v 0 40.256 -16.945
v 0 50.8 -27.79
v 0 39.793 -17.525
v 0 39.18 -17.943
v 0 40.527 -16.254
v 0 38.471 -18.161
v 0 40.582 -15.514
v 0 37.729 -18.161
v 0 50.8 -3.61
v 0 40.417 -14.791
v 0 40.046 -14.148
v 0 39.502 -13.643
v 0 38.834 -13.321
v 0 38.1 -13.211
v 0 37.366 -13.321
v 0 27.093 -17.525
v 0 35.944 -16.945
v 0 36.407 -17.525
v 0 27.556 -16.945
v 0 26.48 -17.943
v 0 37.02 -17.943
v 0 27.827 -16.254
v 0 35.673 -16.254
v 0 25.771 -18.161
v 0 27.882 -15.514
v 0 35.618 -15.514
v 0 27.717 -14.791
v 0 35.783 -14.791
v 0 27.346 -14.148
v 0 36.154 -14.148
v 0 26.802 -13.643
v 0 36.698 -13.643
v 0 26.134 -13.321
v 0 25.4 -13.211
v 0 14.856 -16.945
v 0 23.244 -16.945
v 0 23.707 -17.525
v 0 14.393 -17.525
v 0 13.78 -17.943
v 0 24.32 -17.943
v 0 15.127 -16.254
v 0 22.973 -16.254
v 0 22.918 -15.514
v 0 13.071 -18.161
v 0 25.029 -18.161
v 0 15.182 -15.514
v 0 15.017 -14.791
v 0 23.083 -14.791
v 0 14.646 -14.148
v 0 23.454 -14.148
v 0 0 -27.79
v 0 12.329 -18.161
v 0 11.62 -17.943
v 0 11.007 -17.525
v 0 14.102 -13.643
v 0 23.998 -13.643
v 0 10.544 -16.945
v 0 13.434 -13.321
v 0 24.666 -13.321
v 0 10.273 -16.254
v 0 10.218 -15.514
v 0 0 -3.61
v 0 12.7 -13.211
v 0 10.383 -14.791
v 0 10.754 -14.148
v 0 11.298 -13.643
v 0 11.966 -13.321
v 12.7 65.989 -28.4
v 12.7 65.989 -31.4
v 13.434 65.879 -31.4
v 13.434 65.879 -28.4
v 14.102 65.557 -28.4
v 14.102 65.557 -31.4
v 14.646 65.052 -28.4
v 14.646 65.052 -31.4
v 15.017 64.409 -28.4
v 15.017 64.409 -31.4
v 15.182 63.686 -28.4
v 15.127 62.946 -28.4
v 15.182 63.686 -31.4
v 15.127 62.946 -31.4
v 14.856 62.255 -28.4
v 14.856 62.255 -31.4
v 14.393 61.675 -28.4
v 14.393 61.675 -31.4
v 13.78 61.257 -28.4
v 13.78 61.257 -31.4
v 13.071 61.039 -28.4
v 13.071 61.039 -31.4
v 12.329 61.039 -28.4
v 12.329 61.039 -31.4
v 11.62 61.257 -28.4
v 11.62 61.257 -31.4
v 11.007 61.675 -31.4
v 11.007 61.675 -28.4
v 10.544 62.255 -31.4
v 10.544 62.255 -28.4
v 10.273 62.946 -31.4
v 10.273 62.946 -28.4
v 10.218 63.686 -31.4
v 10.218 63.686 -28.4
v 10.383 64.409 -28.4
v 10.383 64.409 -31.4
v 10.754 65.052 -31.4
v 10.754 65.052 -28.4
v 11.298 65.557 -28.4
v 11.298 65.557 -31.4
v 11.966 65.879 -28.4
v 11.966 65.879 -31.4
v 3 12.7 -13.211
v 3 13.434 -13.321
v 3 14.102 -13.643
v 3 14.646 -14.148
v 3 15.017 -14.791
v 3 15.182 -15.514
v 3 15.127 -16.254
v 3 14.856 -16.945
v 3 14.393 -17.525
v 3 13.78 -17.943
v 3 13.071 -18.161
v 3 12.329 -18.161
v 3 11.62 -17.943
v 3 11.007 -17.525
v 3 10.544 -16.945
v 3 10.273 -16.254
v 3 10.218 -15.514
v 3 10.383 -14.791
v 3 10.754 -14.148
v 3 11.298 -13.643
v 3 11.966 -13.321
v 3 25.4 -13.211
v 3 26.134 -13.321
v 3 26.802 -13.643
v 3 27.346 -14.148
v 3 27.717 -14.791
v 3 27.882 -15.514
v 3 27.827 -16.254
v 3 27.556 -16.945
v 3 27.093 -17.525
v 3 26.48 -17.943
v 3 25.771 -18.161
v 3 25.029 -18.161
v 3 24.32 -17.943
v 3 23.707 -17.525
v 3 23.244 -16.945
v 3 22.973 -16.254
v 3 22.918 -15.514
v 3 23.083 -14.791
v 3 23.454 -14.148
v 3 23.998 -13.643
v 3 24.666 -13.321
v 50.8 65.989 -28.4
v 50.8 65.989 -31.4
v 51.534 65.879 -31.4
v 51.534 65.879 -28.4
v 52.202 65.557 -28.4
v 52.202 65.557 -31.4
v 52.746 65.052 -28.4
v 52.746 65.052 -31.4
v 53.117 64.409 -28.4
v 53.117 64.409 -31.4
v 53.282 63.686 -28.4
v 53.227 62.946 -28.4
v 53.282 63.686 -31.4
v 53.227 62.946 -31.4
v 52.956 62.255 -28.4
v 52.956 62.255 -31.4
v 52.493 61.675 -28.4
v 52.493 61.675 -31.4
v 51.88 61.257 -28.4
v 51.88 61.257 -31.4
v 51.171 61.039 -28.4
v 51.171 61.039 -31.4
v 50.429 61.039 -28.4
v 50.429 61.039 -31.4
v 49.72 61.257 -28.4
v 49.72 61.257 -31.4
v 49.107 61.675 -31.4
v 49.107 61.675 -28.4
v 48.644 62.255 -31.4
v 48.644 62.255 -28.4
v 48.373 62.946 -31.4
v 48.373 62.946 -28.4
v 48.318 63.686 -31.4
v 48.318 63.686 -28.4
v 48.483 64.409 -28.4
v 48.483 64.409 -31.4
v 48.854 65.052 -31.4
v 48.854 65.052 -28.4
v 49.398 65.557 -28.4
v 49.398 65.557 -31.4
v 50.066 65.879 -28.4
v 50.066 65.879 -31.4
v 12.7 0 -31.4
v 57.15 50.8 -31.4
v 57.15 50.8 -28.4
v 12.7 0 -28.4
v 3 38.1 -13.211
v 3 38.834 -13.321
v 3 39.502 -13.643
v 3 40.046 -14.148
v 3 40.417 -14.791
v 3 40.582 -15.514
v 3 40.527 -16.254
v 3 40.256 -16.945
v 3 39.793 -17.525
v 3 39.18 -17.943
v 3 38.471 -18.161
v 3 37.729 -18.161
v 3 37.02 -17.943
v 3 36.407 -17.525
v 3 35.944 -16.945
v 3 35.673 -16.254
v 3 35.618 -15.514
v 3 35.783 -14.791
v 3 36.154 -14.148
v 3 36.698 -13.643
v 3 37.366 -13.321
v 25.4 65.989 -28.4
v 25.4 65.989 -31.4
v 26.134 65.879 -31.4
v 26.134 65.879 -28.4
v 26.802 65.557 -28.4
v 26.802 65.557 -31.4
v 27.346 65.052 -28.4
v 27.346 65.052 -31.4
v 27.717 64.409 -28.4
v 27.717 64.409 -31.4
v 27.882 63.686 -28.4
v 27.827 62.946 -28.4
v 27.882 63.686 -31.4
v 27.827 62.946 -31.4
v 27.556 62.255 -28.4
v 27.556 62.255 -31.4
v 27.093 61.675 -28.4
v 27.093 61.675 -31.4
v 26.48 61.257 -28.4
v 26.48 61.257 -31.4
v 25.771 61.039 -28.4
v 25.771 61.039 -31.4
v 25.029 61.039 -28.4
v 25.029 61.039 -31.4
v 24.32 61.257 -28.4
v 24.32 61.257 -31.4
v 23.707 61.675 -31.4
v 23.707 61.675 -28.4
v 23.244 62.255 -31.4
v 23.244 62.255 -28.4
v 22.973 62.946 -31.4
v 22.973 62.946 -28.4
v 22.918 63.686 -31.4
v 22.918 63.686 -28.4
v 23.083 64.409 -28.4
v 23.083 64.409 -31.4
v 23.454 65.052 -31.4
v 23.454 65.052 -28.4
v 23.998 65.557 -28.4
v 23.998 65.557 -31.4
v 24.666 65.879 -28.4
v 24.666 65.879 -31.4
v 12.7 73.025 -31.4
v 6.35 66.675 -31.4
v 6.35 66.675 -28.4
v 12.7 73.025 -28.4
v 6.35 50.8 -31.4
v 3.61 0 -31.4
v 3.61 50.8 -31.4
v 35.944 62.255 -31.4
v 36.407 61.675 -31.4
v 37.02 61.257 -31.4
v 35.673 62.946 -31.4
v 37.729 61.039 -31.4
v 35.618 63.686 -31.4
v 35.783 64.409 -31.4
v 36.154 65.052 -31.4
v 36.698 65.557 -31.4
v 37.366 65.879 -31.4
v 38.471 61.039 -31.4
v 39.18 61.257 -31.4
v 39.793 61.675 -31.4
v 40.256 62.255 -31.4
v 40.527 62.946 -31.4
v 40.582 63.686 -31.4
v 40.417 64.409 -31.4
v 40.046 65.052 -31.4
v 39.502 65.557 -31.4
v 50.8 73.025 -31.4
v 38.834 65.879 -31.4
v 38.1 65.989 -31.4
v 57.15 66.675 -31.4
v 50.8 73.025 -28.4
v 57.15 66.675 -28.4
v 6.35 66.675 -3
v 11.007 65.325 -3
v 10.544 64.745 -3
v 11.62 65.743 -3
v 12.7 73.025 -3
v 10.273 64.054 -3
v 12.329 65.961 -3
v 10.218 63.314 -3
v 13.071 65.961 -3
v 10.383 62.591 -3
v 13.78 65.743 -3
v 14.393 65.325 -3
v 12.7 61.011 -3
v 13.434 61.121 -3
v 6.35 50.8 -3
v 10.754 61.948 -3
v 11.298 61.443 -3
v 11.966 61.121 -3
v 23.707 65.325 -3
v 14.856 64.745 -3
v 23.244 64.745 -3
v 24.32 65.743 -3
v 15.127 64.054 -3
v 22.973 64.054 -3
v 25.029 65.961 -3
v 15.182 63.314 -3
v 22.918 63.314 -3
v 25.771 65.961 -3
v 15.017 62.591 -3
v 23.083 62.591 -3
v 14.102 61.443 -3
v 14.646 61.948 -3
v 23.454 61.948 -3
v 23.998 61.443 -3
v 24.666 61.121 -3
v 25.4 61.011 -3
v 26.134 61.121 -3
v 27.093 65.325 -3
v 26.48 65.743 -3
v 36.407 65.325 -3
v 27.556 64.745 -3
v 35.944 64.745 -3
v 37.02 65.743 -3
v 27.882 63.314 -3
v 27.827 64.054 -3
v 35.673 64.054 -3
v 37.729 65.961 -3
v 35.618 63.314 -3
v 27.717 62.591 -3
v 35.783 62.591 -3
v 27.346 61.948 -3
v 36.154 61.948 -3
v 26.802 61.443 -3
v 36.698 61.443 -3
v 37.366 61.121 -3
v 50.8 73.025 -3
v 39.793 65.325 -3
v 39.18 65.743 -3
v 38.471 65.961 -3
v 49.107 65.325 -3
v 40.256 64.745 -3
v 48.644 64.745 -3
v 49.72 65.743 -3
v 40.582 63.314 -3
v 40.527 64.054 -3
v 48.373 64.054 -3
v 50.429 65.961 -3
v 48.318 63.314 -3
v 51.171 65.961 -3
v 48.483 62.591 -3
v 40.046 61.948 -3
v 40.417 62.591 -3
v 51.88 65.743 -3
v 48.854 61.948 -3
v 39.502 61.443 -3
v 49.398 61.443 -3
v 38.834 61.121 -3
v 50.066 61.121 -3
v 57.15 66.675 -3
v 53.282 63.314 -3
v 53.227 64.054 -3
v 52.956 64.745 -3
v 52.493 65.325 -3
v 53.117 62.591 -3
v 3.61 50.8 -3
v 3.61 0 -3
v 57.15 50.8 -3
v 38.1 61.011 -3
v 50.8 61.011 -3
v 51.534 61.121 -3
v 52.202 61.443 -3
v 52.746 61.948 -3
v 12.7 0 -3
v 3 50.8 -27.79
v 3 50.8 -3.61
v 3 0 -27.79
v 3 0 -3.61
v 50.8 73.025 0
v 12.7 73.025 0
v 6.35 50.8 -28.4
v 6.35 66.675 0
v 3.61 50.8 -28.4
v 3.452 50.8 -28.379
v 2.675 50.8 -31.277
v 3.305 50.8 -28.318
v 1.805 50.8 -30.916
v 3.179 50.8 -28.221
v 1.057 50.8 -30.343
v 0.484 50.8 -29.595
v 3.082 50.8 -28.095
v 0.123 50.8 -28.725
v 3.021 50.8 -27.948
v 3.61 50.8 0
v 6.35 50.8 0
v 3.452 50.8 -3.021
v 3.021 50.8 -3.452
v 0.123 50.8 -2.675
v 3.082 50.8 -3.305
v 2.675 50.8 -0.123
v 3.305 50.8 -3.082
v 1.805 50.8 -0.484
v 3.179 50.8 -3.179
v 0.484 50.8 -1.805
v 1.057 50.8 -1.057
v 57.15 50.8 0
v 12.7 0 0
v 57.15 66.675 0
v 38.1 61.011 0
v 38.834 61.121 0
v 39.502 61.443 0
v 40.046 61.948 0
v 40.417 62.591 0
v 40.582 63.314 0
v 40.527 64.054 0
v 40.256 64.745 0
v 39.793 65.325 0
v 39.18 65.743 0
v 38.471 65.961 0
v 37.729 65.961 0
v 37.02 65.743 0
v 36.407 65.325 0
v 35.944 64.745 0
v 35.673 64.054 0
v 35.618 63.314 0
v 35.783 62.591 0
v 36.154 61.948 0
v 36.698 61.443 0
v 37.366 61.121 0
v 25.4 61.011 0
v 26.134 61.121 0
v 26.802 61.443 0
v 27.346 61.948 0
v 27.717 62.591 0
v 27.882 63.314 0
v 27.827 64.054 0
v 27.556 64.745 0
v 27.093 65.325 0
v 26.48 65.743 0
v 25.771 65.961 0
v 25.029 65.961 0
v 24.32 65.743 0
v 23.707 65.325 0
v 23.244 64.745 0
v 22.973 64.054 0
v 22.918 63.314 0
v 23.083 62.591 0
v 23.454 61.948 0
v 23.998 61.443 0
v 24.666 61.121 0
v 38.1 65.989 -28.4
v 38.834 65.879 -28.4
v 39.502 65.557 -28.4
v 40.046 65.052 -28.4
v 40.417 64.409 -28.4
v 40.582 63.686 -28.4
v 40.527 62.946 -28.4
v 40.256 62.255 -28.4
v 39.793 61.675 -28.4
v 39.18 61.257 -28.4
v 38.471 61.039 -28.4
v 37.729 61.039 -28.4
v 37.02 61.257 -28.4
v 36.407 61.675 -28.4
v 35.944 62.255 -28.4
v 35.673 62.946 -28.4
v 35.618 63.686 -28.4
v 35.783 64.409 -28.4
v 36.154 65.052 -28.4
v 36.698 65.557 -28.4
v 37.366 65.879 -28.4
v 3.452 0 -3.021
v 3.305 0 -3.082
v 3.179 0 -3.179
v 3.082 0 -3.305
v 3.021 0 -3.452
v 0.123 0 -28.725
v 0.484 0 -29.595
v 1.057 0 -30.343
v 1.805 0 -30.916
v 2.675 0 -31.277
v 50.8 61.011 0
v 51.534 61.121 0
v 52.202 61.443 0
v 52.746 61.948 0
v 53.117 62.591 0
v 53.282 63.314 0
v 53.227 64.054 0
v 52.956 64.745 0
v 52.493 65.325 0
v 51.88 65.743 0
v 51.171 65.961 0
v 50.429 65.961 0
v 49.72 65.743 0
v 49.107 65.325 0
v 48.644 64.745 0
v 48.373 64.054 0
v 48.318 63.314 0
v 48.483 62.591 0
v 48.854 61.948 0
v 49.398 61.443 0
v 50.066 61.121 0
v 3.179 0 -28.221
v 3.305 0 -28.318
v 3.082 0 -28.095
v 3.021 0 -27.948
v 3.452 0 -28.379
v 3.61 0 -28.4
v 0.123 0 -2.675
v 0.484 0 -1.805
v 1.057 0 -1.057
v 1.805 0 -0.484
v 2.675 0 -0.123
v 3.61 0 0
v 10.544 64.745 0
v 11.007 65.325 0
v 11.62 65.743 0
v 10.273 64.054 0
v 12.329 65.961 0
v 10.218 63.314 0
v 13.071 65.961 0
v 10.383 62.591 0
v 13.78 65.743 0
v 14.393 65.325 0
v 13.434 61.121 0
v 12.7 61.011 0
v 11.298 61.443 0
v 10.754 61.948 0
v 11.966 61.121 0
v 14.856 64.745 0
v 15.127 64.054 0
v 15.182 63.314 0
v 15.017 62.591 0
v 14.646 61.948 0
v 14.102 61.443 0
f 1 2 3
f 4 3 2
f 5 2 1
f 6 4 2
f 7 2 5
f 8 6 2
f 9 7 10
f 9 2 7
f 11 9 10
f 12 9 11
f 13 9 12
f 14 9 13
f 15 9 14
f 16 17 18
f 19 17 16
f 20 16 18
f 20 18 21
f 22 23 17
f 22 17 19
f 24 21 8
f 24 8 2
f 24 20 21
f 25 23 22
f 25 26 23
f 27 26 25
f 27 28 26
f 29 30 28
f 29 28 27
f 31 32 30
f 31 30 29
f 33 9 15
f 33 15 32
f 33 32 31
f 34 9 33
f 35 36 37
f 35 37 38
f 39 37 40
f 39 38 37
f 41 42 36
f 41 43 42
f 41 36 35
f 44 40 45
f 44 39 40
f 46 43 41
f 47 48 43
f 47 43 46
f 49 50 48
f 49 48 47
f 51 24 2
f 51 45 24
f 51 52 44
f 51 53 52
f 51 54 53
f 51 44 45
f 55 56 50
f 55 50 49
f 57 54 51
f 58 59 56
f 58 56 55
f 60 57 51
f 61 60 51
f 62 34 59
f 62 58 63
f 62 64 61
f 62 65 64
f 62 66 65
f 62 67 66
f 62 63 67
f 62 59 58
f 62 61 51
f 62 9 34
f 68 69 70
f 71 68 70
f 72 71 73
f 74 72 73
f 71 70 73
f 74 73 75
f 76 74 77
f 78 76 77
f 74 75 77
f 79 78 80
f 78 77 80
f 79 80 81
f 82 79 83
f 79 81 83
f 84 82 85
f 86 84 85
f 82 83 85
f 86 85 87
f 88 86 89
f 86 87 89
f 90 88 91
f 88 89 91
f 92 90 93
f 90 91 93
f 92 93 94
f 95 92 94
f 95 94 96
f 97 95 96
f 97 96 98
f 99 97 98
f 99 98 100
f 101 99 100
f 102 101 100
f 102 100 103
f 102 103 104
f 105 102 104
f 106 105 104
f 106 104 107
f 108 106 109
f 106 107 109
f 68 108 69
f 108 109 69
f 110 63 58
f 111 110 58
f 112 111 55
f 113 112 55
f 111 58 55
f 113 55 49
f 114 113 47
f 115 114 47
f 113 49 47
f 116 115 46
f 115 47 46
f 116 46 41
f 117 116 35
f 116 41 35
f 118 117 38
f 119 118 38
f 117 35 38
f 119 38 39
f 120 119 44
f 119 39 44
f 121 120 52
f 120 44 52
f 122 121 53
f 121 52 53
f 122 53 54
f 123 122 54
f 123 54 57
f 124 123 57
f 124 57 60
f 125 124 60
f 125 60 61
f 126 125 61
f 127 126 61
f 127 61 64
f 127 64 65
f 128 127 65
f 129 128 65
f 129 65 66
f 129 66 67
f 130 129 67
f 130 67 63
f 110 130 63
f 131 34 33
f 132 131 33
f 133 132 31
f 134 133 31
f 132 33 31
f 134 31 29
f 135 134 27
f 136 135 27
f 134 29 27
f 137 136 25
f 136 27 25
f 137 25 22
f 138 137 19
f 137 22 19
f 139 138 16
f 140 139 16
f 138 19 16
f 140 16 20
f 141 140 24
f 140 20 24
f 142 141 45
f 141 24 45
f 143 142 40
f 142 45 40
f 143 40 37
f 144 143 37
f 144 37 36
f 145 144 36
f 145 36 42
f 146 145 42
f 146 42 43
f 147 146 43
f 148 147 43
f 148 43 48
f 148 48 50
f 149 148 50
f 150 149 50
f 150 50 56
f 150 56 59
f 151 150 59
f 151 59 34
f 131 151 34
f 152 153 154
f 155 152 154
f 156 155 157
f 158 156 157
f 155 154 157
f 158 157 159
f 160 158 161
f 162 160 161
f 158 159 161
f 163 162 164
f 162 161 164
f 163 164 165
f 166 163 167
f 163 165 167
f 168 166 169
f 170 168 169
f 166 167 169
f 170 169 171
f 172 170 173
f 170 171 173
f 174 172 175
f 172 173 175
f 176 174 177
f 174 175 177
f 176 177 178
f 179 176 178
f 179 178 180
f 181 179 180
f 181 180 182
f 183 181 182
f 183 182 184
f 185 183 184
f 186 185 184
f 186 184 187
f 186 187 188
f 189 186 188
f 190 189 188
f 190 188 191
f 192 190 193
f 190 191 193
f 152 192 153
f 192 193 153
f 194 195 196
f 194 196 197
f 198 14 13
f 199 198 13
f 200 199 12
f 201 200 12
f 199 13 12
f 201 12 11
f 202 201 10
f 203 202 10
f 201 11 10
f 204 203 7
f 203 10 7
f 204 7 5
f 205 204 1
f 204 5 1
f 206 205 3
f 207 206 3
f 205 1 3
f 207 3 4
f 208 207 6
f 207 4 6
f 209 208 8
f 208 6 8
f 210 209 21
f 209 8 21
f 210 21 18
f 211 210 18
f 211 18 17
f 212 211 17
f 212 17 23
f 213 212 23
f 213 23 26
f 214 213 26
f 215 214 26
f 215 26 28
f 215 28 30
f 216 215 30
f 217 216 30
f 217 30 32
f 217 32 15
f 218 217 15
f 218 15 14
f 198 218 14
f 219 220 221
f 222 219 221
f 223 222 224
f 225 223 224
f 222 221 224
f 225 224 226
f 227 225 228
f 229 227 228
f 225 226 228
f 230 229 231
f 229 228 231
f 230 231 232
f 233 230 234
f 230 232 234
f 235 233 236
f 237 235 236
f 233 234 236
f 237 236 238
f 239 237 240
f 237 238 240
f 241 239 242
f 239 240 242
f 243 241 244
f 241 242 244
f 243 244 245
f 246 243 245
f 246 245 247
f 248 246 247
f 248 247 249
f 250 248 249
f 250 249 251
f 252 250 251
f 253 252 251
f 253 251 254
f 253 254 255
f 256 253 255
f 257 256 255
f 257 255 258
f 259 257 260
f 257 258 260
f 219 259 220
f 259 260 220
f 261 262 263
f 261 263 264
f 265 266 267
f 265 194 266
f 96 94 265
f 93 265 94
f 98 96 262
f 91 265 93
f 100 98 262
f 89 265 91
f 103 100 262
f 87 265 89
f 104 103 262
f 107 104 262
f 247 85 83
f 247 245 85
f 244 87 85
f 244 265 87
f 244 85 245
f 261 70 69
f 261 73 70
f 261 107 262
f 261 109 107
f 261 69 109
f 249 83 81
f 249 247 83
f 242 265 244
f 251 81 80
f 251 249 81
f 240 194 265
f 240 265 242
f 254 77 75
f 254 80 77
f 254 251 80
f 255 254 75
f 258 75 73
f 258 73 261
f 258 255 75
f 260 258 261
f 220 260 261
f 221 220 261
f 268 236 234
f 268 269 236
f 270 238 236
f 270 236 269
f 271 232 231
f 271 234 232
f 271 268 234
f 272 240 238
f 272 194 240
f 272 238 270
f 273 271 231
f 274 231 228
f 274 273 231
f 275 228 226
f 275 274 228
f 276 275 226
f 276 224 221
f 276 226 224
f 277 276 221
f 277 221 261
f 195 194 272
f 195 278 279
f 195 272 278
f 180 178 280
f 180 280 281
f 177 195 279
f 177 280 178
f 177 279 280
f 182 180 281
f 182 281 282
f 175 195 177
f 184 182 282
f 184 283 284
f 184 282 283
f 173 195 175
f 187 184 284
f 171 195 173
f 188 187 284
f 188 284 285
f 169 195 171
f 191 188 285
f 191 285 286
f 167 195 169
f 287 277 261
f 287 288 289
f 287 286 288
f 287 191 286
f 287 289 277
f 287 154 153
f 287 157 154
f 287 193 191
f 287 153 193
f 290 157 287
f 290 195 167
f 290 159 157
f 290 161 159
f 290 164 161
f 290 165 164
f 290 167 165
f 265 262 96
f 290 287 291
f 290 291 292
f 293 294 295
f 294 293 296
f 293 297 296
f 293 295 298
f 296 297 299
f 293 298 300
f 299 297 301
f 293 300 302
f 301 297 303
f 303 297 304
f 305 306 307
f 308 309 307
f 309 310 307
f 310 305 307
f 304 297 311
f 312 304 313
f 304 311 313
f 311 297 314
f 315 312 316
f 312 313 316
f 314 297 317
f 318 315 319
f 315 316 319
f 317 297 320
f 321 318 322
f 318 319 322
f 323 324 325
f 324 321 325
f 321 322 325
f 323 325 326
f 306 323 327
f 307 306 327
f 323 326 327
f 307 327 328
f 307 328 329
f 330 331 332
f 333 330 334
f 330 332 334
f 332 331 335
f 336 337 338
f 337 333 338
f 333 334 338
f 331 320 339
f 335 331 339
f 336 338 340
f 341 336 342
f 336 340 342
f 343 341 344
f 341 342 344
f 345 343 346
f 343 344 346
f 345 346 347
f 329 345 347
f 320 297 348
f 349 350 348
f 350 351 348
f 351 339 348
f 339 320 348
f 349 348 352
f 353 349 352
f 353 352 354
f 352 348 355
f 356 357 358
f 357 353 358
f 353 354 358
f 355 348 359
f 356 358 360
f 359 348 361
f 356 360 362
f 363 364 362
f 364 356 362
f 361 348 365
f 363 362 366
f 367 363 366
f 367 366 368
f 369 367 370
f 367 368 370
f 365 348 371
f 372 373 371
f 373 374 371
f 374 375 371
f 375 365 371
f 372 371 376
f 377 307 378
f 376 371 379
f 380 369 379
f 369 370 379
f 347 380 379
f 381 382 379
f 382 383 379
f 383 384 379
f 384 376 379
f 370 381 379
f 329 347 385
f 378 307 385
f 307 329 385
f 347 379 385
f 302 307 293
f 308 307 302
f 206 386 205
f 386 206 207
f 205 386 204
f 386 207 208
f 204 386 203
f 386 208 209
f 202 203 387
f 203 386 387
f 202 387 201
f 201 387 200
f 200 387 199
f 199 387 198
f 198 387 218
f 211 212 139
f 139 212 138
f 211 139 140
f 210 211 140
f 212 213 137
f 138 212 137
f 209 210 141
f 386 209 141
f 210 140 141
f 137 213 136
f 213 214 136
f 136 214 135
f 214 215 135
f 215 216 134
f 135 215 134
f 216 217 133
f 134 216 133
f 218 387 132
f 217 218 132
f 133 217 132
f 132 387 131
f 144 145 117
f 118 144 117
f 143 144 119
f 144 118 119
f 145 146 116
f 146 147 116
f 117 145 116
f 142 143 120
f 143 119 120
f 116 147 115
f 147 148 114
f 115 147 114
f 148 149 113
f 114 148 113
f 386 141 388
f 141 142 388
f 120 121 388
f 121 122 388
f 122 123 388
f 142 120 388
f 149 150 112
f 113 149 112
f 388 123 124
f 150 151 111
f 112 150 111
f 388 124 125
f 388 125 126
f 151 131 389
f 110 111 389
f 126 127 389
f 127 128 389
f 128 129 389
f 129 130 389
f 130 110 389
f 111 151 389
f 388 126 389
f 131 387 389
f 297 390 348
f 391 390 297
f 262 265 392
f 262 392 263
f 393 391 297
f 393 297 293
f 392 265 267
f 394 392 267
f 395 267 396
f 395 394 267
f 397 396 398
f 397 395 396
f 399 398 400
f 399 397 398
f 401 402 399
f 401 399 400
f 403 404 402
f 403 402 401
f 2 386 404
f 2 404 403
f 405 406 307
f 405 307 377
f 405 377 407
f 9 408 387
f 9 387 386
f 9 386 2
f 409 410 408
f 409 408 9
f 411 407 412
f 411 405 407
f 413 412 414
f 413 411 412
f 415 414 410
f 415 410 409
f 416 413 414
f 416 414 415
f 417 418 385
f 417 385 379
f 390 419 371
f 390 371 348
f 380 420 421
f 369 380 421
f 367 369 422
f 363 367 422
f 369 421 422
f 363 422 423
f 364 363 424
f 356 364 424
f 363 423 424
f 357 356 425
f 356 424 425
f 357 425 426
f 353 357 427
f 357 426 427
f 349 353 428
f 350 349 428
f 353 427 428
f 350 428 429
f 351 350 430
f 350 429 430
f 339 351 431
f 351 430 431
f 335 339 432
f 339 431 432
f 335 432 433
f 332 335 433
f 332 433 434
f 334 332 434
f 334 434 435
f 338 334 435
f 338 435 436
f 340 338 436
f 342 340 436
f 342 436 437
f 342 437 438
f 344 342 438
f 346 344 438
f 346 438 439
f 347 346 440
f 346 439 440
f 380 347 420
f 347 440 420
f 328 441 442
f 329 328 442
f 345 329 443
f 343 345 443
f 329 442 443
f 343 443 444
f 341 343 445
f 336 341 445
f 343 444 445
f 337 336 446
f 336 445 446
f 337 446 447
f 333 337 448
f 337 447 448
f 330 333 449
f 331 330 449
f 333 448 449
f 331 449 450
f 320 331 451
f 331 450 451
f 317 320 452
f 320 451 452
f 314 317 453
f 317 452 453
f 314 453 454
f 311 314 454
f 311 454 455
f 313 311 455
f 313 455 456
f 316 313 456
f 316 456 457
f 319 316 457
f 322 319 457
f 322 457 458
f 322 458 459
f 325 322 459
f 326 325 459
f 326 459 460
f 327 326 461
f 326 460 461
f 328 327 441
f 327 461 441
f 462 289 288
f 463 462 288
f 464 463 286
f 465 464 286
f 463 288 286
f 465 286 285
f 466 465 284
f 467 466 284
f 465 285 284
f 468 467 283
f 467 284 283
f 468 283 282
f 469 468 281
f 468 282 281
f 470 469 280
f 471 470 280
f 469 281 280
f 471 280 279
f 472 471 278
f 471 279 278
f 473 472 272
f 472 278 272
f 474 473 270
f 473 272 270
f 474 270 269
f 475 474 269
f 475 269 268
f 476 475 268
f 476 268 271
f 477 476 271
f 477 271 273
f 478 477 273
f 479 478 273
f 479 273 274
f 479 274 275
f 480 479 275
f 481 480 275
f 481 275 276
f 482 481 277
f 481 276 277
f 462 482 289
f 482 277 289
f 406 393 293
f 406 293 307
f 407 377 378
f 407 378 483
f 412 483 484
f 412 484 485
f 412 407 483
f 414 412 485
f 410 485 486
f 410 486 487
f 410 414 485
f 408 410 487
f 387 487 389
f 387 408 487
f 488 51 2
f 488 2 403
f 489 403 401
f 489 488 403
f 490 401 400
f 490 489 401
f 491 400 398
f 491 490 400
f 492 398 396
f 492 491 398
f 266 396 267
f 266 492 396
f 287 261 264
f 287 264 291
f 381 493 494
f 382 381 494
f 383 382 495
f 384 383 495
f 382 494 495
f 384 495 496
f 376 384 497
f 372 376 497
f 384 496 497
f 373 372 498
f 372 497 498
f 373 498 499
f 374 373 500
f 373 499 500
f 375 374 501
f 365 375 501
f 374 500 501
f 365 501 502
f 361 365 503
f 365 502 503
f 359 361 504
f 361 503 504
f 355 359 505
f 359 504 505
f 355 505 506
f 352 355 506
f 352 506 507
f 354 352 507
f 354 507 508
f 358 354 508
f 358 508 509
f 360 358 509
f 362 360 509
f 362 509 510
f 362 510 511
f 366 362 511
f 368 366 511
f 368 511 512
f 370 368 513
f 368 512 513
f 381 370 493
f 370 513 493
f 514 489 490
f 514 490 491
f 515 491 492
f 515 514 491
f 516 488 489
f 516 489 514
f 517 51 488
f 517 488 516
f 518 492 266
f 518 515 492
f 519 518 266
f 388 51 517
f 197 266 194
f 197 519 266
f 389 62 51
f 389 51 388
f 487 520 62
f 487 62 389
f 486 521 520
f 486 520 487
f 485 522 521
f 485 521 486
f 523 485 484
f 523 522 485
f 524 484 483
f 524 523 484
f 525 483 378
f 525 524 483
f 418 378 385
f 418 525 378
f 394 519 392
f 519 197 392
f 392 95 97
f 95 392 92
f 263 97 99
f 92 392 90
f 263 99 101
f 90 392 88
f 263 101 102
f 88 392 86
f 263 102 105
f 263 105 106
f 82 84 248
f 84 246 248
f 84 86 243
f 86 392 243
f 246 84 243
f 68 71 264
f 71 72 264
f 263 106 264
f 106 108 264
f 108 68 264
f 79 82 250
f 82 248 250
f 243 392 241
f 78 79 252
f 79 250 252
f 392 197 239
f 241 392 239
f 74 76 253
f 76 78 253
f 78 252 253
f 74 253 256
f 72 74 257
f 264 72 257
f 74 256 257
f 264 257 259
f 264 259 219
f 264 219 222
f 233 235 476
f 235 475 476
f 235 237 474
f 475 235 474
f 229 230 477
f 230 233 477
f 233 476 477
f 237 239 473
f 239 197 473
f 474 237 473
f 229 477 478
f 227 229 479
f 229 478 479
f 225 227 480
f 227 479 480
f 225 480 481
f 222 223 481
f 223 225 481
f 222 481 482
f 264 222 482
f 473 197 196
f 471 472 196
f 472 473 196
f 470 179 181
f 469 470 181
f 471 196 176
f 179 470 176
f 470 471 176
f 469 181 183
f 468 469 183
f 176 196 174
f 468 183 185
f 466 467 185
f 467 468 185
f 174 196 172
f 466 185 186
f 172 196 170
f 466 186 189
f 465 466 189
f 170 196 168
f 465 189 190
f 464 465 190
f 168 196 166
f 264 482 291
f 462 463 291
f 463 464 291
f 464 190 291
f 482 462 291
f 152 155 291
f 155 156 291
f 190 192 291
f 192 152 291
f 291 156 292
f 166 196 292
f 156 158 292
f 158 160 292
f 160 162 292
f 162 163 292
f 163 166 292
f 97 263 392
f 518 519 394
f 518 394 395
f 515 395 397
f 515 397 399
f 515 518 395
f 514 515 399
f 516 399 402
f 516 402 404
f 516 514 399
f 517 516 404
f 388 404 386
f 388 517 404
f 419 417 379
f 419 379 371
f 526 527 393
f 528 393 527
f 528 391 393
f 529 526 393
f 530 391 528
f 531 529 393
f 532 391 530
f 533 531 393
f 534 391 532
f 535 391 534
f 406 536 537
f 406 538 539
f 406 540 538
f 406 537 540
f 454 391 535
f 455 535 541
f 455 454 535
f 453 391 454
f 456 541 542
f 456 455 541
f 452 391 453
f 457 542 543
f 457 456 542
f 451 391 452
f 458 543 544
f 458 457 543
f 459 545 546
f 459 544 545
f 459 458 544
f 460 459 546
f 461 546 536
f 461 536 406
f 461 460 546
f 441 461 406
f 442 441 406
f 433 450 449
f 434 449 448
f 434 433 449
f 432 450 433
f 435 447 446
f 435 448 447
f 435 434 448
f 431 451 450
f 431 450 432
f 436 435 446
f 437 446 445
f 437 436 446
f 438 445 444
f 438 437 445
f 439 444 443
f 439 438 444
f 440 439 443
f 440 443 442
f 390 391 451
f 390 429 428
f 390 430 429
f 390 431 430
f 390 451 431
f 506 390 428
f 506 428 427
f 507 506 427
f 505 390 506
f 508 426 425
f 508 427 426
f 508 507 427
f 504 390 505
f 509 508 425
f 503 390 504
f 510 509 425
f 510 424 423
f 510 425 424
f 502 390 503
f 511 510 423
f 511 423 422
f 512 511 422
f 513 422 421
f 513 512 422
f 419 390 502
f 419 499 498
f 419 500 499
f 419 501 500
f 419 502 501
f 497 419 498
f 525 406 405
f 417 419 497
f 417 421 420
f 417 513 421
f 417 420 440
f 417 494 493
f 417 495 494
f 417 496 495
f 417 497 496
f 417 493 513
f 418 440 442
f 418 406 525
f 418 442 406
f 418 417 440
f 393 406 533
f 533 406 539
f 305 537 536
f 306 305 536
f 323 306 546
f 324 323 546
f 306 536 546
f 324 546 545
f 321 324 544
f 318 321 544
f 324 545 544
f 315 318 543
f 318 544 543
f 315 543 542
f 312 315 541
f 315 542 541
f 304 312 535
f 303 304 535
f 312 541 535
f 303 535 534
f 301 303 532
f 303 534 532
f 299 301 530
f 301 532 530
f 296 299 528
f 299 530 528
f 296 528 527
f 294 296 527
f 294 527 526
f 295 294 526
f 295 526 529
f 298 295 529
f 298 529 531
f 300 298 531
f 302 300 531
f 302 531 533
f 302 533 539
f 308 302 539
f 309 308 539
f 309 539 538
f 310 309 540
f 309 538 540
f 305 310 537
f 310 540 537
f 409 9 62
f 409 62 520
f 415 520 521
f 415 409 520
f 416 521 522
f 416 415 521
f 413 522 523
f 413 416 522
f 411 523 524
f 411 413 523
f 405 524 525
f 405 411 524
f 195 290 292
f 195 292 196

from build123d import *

# Parameters (mm, degrees)
SKETCH7_W                  = 50.8
SKETCH7_H                  = 24.1808
BASE_FLANGE1_DEPTH         = 3
F_9_0_196_DIAMETER_HOLE1_D = 4.9784
EDGE_FLANGE1_DEPTH         = 50.8
EDGE_FLANGE1_START         = 3
EDGE_FLANGE1_PROFILE_R     = 2.4892
EDGE_FLANGE1_FLAT_DEPTH    = 3
EDGE_FLANGE2_DEPTH         = 50.8
EDGE_FLANGE2_START         = 3
EDGE_FLANGE2_PROFILE_R     = 2.4892
EDGE_FLANGE2_FLAT_DEPTH    = 3


# Sheet-metal steps are written as plain solids
with BuildPart() as part:
    # Sketch7 → Base-Flange1 (new body)
    with BuildSketch(Plane(origin=(0, 0, 0), x_dir=(0, -1, 0), z_dir=(-1, 0, 0))):
        with Locations((-25.4, -15.7)):
            Rectangle(SKETCH7_W, SKETCH7_H)
    extrude(amount=-BASE_FLANGE1_DEPTH)

    # #9 (0.196) Diameter Hole1 (through all)
    with Locations(Plane(origin=(3, 0, 0), x_dir=(0, 0, -1), z_dir=(1, 0, 0))):
        with Locations((15.7, 25.4), (15.7, 12.7), (15.7, 38.1)):
            Hole(F_9_0_196_DIAMETER_HOLE1_D / 2)

    # Edge-Flange1 bend section (across the edge) → Edge-Flange1 (add)
    with BuildSketch(Plane(origin=(3, 0, -28.4), x_dir=(0, 0, 1), z_dir=(0, 1, 0))):
        with BuildLine():
            Line((-3, 0.6096), (0, 0.6096))
            ThreePointArc((0, 0.6096), (0.178547706, 0.178547706), (0.6096, 0))
            Line((0.6096, 0), (0.6096, -3))
            ThreePointArc((0.6096, -3), (-1.942772637, -1.942772637), (-3, 0.6096))
        make_face()
    extrude(amount=EDGE_FLANGE1_DEPTH)

    # Edge-Flange1 profile (on flange) → Edge-Flange1 flat (add)
    with BuildSketch(Plane(origin=(3, 0, -28.4), x_dir=(0, 1, 0), z_dir=(0, 0, -1)).offset(EDGE_FLANGE1_START)):
        Polygon((0, 0.6096), (50.8, 0.6096), (50.8, 3.35), (66.675, 3.35), (73.025, 9.7), (73.025, 47.8), (66.675, 54.15), (50.8, 54.15), (0, 9.7), align=None)
        with Locations((63.5, 9.7)):
            Circle(EDGE_FLANGE1_PROFILE_R, mode=Mode.SUBTRACT)
        with Locations((63.5, 22.4)):
            Circle(EDGE_FLANGE1_PROFILE_R, mode=Mode.SUBTRACT)
        with Locations((63.5, 35.1)):
            Circle(EDGE_FLANGE1_PROFILE_R, mode=Mode.SUBTRACT)
        with Locations((63.5, 47.8)):
            Circle(EDGE_FLANGE1_PROFILE_R, mode=Mode.SUBTRACT)
    extrude(amount=-EDGE_FLANGE1_FLAT_DEPTH)

    # Edge-Flange2 bend section (across the edge) → Edge-Flange2 (add)
    with BuildSketch(Plane(origin=(3, 50.8, -3), x_dir=(0, 0, -1), z_dir=(0, -1, 0))):
        with BuildLine():
            Line((-3, 0.6096), (0, 0.6096))
            ThreePointArc((0, 0.6096), (0.178547706, 0.178547706), (0.6096, 0))
            Line((0.6096, 0), (0.6096, -3))
            ThreePointArc((0.6096, -3), (-1.942772637, -1.942772637), (-3, 0.6096))
        make_face()
    extrude(amount=EDGE_FLANGE2_DEPTH)

    # Edge-Flange2 profile (on flange) → Edge-Flange2 flat (add)
    with BuildSketch(Plane(origin=(3, 0, -3), x_dir=(0, -1, 0), z_dir=(0, 0, 1)).offset(EDGE_FLANGE2_START)):
        Polygon((0, 0.6096), (0, 9.7), (-50.8, 54.15), (-66.675, 54.15), (-73.025, 47.8), (-73.025, 9.7), (-66.675, 3.35), (-50.8, 3.35), (-50.8, 0.6096), align=None)
        with Locations((-63.5, 9.7)):
            Circle(EDGE_FLANGE2_PROFILE_R, mode=Mode.SUBTRACT)
        with Locations((-63.5, 22.4)):
            Circle(EDGE_FLANGE2_PROFILE_R, mode=Mode.SUBTRACT)
        with Locations((-63.5, 35.1)):
            Circle(EDGE_FLANGE2_PROFILE_R, mode=Mode.SUBTRACT)
        with Locations((-63.5, 47.8)):
            Circle(EDGE_FLANGE2_PROFILE_R, mode=Mode.SUBTRACT)
    extrude(amount=-EDGE_FLANGE2_FLAT_DEPTH)


solid = part.part
